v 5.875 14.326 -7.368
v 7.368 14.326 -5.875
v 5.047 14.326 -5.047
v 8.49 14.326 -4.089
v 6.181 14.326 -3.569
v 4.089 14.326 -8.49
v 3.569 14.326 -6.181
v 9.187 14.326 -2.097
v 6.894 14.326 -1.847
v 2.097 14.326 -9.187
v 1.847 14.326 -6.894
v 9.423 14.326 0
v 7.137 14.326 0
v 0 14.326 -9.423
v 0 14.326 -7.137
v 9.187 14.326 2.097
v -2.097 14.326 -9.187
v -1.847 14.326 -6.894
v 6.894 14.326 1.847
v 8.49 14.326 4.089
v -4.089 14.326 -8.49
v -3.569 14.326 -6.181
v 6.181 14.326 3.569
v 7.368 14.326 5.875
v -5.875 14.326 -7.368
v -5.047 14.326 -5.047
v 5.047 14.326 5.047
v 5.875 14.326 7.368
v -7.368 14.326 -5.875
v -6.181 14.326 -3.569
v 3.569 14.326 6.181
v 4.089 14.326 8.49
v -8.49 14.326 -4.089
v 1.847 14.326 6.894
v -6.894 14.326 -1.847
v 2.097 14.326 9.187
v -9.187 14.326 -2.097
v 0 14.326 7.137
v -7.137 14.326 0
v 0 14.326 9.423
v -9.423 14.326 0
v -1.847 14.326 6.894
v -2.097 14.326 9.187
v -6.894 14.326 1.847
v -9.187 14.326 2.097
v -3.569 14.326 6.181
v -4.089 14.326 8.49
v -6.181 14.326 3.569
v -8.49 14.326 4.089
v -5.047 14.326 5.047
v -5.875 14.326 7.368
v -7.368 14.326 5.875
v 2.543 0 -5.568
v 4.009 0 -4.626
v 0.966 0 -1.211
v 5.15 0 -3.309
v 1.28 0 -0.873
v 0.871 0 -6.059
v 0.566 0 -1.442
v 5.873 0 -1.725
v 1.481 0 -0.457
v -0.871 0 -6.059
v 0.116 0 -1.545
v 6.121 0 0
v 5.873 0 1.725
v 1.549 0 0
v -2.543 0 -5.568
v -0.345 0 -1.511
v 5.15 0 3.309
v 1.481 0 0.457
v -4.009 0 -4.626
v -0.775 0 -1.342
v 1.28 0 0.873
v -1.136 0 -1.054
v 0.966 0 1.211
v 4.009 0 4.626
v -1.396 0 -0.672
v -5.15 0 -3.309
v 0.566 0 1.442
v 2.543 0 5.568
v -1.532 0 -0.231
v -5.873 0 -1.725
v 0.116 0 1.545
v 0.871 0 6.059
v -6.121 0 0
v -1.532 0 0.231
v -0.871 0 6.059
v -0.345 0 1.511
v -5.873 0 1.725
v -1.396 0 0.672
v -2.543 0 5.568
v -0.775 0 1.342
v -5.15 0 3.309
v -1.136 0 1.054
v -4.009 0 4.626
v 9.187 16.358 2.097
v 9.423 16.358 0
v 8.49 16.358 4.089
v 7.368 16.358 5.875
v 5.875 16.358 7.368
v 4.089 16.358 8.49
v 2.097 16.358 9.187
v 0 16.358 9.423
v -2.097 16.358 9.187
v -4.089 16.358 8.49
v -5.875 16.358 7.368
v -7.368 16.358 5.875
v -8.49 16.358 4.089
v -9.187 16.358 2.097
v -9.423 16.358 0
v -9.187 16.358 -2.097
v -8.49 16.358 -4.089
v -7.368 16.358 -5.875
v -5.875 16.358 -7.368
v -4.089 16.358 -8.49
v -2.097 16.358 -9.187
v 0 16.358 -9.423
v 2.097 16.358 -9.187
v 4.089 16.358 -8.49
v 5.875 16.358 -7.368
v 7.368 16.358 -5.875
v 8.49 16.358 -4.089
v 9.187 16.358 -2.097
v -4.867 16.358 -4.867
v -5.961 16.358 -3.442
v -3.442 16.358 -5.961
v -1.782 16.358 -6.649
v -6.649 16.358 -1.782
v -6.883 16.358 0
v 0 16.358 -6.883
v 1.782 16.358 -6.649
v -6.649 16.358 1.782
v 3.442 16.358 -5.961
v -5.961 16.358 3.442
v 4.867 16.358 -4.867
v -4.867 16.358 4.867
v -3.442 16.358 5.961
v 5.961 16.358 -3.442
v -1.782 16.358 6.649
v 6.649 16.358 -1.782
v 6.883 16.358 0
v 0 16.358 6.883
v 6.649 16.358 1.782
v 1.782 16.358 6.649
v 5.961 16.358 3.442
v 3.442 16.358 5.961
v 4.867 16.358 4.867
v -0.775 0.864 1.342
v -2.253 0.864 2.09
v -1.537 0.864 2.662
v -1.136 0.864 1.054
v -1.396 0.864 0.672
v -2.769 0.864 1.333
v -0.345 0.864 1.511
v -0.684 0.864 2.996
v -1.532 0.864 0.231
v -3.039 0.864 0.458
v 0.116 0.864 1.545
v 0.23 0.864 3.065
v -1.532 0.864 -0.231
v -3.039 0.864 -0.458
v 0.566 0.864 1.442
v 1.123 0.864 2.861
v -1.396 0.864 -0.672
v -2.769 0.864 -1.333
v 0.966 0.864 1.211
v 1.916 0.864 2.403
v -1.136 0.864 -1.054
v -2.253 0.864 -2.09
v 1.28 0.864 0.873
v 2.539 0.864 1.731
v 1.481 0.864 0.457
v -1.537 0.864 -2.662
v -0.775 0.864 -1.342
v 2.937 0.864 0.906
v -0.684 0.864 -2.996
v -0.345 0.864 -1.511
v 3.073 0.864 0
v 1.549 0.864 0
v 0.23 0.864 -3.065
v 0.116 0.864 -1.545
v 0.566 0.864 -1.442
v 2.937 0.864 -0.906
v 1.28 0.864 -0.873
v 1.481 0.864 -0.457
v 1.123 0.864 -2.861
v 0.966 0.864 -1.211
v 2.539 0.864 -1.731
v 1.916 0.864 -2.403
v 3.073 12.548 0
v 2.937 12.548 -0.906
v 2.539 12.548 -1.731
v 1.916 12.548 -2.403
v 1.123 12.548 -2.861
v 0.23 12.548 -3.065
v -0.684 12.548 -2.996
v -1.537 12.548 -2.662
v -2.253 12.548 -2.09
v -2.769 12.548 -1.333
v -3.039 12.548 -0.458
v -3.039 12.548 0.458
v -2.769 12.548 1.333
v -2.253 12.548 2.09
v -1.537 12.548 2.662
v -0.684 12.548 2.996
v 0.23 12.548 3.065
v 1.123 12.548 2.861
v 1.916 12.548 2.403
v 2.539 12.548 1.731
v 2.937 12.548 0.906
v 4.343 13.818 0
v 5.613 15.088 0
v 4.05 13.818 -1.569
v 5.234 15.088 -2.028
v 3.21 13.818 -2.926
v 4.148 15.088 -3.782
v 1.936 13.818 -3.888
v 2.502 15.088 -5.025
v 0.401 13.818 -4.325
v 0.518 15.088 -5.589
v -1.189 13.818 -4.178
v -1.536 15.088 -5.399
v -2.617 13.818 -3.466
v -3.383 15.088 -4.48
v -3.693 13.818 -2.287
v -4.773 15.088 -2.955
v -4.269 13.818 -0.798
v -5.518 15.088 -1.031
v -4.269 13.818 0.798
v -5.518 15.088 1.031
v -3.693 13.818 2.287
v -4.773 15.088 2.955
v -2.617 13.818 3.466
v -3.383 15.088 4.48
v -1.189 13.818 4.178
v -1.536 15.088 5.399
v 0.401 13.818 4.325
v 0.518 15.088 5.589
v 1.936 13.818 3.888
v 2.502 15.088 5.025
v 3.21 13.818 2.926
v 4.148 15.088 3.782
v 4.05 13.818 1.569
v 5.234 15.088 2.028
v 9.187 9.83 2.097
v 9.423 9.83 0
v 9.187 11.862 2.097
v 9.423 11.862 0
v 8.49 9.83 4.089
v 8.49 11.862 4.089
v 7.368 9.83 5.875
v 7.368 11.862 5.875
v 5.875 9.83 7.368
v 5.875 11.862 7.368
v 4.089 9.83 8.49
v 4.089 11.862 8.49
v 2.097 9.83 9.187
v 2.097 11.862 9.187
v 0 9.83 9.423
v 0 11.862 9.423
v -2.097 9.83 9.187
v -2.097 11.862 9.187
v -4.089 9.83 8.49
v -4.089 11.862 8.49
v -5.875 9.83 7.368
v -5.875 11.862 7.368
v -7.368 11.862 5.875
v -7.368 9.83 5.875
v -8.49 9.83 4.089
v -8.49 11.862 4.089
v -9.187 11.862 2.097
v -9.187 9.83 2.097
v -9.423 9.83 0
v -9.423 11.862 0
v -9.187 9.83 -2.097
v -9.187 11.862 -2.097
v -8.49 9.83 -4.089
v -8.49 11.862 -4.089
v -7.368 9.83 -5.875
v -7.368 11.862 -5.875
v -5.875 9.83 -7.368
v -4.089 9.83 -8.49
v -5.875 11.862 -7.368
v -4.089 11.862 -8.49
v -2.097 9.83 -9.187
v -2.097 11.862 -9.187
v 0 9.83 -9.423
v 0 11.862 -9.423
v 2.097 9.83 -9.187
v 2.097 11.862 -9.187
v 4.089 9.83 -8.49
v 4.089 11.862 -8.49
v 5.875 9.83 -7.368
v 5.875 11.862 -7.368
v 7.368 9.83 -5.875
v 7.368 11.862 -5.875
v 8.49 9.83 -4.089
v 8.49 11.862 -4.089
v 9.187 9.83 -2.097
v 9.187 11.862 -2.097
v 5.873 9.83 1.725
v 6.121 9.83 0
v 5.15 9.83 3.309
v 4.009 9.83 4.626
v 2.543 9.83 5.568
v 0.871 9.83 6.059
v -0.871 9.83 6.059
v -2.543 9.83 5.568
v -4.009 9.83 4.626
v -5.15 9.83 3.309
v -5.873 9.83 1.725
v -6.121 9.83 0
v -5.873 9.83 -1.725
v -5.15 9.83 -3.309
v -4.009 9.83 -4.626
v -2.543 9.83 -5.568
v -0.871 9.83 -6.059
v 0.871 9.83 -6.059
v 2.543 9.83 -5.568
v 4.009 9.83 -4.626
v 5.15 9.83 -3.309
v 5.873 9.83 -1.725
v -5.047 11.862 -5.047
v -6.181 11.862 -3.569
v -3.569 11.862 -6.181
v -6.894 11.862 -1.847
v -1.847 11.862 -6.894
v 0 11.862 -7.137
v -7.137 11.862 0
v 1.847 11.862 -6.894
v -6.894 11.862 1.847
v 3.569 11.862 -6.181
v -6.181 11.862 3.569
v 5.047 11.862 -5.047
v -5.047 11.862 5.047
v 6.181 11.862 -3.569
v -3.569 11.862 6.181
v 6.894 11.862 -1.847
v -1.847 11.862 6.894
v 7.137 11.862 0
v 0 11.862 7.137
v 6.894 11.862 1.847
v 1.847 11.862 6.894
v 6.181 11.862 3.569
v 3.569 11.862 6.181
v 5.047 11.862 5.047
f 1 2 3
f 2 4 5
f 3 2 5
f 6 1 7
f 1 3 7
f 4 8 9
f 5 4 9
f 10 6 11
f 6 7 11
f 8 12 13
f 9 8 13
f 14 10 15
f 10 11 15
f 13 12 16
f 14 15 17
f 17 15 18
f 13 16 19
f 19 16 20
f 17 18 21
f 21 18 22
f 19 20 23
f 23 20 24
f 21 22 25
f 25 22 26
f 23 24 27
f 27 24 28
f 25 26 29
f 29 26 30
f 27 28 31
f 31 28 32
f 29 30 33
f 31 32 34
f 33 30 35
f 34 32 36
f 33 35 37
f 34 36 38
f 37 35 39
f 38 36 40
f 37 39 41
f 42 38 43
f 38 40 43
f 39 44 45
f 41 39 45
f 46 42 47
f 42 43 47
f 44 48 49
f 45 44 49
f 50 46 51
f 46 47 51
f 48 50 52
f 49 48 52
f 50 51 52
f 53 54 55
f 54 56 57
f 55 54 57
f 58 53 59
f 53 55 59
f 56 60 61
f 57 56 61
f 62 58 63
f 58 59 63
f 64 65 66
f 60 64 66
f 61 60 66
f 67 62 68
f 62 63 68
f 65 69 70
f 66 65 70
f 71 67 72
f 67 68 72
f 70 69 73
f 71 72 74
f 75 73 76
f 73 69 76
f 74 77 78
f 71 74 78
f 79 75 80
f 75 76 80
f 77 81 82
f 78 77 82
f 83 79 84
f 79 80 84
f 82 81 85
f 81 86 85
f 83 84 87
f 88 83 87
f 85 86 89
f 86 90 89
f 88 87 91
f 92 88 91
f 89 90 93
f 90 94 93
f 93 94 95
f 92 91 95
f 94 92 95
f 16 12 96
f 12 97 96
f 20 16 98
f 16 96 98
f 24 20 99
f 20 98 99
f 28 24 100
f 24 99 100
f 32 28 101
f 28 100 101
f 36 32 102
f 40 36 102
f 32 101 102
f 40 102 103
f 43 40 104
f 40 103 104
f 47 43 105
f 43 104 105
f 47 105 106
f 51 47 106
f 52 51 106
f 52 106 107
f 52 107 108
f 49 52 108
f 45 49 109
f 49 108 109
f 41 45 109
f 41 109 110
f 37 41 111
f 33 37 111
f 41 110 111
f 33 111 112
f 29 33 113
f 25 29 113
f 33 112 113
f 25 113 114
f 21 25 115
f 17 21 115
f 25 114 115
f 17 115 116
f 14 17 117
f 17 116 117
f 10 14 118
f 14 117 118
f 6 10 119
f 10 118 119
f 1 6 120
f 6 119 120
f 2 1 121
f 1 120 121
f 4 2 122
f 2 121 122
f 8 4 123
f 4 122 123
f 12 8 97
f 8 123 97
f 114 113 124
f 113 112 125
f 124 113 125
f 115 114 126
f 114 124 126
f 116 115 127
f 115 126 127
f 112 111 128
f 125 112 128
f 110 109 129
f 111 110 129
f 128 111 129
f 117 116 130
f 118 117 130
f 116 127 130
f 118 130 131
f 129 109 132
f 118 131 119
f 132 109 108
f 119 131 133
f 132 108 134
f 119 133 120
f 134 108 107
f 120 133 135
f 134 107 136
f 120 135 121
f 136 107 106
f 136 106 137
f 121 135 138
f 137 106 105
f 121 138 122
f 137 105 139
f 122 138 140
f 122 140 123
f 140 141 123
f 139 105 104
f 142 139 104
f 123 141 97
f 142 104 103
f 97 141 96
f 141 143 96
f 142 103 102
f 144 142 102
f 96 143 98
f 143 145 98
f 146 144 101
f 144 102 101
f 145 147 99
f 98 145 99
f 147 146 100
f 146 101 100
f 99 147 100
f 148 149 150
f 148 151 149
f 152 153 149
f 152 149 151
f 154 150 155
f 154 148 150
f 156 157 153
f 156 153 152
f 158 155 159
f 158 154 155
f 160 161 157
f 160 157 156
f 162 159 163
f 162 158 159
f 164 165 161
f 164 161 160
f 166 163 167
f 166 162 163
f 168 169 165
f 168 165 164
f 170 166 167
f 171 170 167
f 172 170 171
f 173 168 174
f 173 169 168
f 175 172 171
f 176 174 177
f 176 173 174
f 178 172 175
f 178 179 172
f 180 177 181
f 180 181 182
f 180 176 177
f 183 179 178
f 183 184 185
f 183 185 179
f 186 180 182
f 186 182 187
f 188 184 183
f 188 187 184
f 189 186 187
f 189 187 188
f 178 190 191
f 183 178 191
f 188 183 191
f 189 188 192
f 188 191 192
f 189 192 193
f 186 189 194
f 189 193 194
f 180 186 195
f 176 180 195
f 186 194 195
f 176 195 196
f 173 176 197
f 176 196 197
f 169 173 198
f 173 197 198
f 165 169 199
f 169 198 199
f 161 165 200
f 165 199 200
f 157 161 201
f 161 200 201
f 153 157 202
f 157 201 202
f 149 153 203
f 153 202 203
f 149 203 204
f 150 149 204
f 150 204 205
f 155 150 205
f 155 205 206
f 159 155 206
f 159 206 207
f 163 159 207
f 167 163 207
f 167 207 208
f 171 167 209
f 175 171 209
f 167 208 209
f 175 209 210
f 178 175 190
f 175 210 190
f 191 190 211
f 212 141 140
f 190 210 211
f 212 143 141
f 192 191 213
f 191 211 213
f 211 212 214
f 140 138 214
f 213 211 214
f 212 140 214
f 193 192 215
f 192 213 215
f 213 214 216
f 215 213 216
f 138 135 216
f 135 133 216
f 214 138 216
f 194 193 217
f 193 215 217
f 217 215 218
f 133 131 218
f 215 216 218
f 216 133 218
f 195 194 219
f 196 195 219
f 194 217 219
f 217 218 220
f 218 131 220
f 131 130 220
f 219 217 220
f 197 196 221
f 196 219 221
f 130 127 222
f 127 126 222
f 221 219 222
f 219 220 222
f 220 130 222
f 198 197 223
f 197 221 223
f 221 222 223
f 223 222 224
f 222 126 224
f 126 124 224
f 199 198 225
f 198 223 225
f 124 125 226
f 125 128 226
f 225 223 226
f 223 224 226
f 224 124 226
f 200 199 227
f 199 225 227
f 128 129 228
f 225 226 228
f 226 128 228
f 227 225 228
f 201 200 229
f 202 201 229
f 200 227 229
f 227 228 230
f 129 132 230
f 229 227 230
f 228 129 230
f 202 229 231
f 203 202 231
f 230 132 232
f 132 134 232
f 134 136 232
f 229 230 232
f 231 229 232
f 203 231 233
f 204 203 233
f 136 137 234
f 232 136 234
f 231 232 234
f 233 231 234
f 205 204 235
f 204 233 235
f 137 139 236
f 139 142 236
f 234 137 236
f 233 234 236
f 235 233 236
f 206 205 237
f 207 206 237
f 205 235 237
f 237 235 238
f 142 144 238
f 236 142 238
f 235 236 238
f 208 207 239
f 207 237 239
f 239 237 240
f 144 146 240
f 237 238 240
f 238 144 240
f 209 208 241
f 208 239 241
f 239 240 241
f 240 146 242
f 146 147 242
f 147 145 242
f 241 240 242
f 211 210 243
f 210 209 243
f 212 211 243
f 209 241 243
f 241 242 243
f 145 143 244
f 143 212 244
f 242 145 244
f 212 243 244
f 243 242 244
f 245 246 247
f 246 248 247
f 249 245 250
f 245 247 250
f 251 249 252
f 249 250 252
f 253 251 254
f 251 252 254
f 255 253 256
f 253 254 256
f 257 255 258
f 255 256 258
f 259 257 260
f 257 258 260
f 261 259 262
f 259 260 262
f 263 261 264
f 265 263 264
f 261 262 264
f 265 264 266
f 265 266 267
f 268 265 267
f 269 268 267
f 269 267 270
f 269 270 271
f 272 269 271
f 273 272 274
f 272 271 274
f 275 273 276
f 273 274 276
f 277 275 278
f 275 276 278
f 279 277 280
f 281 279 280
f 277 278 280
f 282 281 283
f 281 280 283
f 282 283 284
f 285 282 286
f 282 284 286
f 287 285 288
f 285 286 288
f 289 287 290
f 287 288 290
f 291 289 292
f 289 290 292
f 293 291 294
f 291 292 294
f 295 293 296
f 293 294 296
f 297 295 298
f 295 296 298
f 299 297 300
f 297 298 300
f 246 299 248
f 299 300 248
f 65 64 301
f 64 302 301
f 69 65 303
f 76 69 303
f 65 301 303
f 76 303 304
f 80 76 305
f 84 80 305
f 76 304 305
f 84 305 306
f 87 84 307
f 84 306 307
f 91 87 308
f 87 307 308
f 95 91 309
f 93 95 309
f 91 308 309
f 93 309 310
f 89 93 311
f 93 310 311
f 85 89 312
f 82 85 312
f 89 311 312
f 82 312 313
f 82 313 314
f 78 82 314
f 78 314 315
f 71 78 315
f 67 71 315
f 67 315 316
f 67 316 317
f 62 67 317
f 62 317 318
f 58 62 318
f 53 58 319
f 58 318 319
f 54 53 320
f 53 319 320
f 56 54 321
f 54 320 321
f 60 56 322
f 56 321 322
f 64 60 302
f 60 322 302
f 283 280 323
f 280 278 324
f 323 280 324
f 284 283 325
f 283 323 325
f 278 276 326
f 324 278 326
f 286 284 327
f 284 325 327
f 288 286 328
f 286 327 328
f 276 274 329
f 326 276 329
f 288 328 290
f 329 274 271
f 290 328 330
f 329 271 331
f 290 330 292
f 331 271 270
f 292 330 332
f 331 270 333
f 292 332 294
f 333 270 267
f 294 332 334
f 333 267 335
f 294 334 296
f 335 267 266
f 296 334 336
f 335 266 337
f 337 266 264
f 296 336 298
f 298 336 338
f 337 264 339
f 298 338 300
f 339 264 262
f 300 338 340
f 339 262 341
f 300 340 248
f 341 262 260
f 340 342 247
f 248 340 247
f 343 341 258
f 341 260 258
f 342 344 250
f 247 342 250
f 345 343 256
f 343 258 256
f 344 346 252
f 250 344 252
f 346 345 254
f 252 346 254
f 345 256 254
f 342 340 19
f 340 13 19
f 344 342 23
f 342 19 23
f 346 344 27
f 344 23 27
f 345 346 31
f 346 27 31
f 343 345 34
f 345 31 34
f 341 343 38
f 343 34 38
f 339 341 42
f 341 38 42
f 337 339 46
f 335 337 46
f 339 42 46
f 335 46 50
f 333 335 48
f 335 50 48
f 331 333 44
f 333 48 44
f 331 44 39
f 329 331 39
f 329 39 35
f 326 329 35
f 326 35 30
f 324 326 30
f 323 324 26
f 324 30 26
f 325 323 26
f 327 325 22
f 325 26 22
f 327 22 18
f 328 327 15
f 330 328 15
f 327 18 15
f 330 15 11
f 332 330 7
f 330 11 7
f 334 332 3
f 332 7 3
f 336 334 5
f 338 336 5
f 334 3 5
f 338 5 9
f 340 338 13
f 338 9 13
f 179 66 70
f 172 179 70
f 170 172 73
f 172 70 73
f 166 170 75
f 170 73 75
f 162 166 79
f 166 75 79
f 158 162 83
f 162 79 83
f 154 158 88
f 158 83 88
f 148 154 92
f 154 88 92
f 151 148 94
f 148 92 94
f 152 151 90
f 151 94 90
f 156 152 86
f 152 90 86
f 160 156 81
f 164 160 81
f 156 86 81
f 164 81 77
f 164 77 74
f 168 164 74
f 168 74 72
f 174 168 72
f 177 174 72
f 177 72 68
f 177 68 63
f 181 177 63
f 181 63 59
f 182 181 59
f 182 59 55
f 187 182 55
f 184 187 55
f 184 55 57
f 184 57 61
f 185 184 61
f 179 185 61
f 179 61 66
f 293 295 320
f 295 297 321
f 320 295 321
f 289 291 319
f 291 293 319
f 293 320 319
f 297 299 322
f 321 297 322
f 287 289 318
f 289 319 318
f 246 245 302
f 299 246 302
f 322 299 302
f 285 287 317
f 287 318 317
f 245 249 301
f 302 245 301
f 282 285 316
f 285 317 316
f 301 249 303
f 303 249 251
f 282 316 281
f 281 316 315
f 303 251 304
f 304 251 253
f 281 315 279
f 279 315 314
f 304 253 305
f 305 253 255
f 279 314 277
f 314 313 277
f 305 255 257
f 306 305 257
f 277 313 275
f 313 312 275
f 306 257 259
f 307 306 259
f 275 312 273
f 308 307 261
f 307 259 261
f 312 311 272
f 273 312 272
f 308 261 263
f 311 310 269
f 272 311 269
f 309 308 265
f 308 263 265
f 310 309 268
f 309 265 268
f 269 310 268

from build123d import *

# Parameters (mm, degrees)
SKETCH2_R          = 3.0734
CUT_EXTRUDE1_DEPTH = 15.494
SKETCH3_R          = 1.5494
CUT_EXTRUDE2_DEPTH = 17.3576
CHAMFER1_SIZE      = 3.81


with BuildPart() as part:
    # Sketch1 → Revolve1 (revolve)
    with BuildSketch(Plane.XY):
        Polygon((0, 0), (6.1214, 0), (6.1214, 9.8298), (9.4234, 9.8298), (9.4234, 11.8618), (7.1374, 11.8618), (7.1374, 14.3256), (9.4234, 14.3256), (9.4234, 16.3576), (0, 16.3576), (0, 9.8298), align=None)
    revolve(axis=Axis((0, 16.3576, 0), (0, -1, 0)))

    # Sketch2 → Cut-Extrude1 (cut)
    with BuildSketch(Plane(origin=(0, 16.3576, 0), x_dir=(1, 0, 0), z_dir=(0, 1, 0))):
        Circle(SKETCH2_R)
    extrude(amount=-CUT_EXTRUDE1_DEPTH, mode=Mode.SUBTRACT)

    # Sketch3 → Cut-Extrude2 (cut, through all)
    with BuildSketch(Plane.XZ):
        Circle(SKETCH3_R)
    extrude(amount=-CUT_EXTRUDE2_DEPTH, mode=Mode.SUBTRACT)

    # Chamfer1
    chamfer1_edges = [part.edges().sort_by_distance(p)[0] for p in [
        (-3.0734, 16.3576, 0),
    ]]
    chamfer(chamfer1_edges, length=CHAMFER1_SIZE)


solid = part.part
